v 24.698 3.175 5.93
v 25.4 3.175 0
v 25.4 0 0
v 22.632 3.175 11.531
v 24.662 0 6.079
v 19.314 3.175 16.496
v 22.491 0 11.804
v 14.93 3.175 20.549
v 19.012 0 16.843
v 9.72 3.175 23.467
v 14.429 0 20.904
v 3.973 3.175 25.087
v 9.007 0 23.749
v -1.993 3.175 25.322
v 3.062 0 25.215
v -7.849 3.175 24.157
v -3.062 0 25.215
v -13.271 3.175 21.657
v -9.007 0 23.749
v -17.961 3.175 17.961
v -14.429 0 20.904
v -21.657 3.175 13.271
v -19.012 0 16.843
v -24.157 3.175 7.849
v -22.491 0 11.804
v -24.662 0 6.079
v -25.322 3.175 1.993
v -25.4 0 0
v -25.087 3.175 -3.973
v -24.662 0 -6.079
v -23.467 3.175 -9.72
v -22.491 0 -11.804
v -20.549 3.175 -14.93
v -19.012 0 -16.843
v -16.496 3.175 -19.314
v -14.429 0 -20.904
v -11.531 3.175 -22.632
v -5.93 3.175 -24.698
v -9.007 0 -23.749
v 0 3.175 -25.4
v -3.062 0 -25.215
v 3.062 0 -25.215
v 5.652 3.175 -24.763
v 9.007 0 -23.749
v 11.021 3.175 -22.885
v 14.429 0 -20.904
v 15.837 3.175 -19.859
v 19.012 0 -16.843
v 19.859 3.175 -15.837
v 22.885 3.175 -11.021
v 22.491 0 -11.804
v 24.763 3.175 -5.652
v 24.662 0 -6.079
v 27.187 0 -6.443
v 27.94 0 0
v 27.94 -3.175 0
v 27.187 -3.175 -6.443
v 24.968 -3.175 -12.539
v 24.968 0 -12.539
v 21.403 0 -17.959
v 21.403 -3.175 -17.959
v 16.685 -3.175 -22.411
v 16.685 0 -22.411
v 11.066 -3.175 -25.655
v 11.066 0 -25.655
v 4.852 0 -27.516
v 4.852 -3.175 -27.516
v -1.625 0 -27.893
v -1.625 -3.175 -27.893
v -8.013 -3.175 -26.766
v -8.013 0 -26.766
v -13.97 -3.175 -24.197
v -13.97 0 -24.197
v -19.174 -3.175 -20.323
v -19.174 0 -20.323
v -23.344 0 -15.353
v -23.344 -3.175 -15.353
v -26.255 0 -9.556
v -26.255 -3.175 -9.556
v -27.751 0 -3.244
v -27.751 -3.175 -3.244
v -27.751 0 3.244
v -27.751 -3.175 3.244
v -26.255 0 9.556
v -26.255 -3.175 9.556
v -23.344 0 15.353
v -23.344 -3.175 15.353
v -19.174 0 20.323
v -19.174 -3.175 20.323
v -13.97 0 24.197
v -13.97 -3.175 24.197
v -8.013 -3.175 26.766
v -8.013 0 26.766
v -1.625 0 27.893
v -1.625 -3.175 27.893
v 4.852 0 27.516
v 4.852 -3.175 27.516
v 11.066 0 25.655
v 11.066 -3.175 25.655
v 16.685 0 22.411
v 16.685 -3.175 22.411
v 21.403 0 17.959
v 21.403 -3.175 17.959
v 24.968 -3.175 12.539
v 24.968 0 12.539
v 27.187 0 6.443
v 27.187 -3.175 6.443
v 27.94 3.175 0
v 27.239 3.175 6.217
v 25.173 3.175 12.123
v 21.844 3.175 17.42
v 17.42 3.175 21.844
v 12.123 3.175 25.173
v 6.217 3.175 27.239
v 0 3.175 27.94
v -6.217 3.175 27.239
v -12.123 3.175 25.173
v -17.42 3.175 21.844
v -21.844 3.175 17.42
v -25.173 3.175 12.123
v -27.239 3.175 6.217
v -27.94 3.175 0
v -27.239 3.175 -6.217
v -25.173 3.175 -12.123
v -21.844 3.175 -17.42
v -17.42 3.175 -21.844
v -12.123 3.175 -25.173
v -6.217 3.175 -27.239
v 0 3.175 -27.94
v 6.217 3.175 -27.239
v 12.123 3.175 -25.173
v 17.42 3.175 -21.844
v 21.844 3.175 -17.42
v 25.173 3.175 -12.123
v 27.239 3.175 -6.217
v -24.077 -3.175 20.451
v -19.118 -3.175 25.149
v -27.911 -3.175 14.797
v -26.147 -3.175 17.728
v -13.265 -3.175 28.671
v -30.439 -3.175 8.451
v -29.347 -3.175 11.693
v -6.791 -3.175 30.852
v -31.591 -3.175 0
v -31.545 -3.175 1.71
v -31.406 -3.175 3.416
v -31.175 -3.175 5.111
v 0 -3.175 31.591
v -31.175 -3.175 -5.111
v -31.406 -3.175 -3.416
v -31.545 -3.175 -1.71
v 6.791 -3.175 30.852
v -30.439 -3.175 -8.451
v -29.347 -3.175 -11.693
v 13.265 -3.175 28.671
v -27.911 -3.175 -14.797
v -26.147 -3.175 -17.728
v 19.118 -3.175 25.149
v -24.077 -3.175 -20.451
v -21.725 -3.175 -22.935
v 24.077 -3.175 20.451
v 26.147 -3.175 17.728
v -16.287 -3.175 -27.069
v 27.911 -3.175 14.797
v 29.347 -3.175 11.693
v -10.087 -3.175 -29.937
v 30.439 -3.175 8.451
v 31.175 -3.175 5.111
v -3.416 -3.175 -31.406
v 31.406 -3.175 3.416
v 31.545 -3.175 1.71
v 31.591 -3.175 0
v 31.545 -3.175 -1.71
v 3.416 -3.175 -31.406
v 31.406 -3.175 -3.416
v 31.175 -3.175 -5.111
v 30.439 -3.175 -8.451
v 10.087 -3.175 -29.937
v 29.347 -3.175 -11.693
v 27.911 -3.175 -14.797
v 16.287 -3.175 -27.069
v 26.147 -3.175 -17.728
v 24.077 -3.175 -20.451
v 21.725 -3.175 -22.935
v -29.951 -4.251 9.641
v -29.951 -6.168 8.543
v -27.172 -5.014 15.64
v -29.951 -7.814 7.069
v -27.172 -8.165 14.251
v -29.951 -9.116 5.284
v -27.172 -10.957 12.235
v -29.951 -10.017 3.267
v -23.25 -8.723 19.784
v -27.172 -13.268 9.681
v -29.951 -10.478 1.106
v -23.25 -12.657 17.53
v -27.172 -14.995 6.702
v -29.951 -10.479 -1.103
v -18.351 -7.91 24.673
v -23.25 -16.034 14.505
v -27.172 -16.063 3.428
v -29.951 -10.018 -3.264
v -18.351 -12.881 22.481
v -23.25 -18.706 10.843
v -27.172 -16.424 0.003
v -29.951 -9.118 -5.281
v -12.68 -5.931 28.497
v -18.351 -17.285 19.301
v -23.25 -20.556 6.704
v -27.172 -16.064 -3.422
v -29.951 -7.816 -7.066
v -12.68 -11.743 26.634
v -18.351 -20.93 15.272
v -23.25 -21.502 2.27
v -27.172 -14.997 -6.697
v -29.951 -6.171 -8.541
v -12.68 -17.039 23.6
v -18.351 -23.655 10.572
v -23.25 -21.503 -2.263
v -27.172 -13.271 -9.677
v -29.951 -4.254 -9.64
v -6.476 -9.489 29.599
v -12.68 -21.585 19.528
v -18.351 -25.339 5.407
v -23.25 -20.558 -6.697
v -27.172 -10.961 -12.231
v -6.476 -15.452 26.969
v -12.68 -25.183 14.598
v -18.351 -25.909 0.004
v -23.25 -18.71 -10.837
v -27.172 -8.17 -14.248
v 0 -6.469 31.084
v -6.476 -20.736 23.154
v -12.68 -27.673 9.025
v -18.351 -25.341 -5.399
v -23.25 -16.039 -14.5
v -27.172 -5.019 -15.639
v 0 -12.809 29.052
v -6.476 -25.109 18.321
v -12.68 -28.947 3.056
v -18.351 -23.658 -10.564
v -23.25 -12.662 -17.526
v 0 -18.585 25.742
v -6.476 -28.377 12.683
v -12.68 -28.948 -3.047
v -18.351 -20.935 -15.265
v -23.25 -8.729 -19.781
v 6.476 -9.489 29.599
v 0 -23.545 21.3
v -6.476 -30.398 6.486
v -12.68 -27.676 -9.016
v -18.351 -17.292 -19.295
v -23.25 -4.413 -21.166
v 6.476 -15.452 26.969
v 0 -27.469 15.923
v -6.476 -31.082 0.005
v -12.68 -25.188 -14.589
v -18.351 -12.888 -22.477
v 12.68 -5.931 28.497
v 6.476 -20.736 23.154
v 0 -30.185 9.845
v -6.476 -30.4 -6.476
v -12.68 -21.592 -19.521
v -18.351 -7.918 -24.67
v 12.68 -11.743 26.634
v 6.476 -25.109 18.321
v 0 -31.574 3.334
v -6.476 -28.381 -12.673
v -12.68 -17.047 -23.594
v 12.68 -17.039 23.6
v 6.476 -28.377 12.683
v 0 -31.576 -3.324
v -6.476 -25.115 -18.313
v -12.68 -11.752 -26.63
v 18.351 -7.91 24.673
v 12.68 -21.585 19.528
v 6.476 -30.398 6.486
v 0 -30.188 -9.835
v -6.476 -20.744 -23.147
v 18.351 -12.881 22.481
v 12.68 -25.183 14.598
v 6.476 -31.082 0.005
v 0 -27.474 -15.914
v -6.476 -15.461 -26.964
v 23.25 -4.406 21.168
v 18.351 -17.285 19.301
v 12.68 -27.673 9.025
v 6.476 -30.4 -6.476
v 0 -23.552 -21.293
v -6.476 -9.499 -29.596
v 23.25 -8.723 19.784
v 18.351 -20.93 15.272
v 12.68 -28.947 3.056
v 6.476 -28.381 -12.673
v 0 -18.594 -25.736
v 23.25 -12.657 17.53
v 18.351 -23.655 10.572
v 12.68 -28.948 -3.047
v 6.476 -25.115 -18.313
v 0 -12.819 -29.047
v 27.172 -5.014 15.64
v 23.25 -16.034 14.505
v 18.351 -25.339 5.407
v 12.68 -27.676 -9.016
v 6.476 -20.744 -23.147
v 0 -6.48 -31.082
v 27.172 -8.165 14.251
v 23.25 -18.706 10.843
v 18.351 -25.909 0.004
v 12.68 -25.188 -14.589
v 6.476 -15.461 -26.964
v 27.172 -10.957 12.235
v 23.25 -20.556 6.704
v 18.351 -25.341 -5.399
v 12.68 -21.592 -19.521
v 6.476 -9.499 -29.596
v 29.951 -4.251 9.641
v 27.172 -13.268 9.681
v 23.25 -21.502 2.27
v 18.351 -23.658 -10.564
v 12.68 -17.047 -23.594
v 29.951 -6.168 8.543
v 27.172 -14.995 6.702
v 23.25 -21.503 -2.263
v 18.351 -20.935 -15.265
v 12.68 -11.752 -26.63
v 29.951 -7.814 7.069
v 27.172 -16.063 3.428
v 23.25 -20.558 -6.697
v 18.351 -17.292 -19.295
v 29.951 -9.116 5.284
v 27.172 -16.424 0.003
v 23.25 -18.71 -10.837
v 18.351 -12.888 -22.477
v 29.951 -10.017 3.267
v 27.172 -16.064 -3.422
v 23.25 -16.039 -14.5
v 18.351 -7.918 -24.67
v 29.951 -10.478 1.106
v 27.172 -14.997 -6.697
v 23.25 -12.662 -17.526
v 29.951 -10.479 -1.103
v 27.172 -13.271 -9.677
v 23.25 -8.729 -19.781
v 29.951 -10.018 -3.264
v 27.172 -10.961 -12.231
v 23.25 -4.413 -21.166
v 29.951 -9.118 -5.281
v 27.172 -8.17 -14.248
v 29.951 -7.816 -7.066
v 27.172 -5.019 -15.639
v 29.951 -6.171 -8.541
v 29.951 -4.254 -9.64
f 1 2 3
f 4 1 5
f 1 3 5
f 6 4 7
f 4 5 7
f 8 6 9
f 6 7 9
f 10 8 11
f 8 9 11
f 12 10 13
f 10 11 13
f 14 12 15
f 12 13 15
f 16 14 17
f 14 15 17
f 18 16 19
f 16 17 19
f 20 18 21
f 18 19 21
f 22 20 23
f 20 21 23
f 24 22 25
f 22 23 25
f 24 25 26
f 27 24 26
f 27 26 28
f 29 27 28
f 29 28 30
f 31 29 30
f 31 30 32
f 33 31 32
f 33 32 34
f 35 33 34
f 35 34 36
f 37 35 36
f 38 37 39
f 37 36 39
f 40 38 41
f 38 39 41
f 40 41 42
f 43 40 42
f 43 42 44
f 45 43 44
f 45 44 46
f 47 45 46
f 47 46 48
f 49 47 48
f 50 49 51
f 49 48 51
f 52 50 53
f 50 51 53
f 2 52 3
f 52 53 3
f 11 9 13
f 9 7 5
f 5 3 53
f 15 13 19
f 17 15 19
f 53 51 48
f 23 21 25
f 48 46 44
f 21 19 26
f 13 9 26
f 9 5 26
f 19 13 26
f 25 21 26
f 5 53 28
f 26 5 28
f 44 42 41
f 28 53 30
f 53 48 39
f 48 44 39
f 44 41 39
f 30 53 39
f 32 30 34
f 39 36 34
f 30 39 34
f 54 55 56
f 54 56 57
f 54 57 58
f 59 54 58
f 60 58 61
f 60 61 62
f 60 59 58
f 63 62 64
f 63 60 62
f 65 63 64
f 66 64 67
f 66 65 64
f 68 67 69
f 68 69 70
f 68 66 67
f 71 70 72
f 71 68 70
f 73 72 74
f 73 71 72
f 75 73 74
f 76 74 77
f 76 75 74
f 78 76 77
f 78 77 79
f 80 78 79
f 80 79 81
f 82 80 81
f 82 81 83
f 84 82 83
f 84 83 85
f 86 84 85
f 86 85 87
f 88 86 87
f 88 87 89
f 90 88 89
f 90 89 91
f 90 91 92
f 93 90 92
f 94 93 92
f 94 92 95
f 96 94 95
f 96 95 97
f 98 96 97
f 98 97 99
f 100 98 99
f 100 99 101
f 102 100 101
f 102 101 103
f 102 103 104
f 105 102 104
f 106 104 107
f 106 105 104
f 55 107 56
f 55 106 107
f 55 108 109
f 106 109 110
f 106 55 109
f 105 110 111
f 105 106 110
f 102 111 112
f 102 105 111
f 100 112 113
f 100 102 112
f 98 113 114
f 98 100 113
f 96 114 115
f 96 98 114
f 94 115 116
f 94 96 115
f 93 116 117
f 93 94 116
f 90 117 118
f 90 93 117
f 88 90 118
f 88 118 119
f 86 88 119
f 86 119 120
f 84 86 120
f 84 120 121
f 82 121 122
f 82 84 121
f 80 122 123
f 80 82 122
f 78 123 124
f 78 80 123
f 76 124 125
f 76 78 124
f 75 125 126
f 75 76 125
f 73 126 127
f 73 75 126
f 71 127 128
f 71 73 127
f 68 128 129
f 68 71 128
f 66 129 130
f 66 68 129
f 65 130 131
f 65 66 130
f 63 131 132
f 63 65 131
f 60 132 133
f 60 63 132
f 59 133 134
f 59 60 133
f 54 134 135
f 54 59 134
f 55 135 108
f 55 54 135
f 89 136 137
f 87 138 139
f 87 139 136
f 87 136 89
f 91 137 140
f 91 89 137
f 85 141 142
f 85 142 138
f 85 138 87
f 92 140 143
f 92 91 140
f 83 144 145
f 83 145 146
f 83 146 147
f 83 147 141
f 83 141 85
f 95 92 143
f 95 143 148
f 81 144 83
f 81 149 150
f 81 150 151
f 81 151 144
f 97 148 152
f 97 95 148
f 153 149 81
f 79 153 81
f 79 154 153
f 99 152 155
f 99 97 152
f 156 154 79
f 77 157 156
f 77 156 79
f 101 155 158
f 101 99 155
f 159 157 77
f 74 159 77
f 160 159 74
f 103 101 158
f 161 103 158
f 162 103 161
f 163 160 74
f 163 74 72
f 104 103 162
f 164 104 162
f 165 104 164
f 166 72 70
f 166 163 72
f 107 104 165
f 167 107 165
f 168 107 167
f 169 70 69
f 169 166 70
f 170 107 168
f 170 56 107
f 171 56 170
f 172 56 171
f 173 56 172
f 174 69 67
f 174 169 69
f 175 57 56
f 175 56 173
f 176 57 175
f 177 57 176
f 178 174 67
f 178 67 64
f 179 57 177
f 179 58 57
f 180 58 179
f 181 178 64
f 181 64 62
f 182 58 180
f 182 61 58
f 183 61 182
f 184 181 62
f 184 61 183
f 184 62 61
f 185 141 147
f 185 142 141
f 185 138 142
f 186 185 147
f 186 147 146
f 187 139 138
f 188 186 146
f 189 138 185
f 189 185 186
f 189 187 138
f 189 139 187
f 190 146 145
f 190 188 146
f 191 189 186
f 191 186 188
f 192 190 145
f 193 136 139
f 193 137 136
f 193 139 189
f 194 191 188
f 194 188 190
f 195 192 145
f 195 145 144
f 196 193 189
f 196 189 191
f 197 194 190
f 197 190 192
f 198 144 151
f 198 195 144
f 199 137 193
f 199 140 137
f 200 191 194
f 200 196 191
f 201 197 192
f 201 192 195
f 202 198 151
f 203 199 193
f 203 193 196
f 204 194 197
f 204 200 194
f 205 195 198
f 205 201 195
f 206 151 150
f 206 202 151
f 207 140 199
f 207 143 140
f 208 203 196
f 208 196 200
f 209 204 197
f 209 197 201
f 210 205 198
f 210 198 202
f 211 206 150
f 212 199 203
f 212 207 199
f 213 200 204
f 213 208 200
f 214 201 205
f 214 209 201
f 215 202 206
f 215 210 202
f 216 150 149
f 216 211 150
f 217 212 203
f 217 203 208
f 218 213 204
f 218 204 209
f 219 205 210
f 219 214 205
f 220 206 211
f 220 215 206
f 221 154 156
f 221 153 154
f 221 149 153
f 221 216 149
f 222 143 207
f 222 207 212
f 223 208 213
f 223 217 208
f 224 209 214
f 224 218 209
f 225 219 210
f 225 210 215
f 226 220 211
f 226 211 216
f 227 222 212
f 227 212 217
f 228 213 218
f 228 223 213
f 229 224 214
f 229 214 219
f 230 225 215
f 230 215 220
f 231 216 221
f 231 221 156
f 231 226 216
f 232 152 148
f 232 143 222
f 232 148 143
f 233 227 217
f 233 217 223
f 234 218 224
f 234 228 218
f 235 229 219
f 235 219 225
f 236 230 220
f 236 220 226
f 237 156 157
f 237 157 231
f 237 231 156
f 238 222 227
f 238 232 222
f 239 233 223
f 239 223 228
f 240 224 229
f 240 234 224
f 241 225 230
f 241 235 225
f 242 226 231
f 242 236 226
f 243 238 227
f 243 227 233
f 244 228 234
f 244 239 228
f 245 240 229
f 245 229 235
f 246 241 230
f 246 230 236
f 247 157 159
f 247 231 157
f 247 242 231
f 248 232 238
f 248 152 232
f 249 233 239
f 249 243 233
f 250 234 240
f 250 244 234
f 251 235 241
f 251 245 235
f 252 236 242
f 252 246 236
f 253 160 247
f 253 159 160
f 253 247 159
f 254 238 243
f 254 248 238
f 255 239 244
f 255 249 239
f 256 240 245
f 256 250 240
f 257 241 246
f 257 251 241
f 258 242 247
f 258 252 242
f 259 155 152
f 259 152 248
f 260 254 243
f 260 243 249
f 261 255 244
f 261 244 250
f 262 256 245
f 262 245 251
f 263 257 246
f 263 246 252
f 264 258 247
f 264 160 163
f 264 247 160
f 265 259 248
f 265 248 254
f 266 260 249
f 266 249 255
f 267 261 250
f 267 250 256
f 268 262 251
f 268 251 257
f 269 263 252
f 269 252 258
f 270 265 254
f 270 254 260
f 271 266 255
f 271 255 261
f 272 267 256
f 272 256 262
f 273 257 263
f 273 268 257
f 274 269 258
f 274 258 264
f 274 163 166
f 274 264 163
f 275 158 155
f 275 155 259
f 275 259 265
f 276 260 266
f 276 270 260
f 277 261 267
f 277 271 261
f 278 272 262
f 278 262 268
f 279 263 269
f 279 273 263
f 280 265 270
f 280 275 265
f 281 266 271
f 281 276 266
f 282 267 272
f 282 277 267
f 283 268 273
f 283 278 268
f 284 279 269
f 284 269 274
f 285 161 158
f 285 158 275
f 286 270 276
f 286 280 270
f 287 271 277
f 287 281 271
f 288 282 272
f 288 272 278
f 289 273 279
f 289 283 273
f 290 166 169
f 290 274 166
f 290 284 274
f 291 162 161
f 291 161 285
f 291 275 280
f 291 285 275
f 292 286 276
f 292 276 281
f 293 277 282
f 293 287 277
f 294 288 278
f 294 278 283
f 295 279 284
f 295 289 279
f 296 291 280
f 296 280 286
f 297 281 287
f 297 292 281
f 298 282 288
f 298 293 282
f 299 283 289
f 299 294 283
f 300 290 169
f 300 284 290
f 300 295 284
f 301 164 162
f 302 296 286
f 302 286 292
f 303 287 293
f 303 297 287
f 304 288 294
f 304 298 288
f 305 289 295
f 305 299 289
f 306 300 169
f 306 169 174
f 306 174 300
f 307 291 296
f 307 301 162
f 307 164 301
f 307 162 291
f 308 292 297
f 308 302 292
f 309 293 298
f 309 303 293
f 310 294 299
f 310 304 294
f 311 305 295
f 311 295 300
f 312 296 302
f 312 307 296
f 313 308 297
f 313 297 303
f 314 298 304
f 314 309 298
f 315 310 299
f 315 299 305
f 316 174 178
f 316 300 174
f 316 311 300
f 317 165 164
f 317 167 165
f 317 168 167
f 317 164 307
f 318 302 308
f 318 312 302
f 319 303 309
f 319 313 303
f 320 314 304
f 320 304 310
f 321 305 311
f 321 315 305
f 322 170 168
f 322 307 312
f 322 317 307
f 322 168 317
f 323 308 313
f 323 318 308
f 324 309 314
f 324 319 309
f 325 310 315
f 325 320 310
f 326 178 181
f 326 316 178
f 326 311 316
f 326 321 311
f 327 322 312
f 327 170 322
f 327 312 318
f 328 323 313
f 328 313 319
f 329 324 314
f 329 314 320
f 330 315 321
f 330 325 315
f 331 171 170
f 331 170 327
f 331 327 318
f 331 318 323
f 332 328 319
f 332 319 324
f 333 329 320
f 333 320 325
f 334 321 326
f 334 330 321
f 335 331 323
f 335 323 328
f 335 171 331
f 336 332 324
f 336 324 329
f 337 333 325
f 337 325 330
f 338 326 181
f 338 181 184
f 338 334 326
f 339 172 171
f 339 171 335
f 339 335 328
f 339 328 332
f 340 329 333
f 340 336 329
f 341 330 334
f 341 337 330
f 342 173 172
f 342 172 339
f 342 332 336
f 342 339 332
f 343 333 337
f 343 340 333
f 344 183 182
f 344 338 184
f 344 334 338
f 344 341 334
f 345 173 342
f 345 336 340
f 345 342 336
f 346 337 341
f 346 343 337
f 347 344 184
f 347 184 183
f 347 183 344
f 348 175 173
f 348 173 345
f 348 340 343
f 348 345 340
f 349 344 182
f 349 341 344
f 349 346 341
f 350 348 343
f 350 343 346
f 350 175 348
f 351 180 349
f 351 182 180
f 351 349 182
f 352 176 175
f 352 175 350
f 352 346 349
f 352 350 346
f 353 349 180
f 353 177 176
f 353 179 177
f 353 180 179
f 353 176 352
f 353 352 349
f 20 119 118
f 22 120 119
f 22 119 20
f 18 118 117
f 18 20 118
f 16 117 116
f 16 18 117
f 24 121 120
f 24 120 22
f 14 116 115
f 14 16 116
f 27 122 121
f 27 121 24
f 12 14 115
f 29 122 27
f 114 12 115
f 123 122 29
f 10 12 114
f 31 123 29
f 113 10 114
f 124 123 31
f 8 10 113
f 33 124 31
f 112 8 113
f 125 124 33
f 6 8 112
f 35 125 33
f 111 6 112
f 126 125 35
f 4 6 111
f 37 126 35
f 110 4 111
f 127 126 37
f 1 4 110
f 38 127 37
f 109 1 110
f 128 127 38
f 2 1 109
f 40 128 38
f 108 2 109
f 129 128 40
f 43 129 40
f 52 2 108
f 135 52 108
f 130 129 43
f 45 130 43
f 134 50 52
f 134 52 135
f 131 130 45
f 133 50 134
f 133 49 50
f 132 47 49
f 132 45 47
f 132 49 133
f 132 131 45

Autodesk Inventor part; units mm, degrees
ref_plane "YZ Plane" through (0, 0, 0) normal (1, 0, 0) x (0, 1, 0)
ref_plane "XZ Plane" through (0, 0, 0) normal (0, 1, 0) x (-1, 0, 0)
ref_plane "XY Plane" through (0, 0, 0) normal (0, 0, 1) x (1, 0, 0)
sketch "Sketch1" plane through (0, 0, 0) normal (0, 1, 0) x (-1, 0, 0)
  arc A0 (31.75, 0) -> (-31.75, 0) centre (0, 0) ccw
  line L0 (0, 0) -> (-31.75, 0) construction
  line L1 (0, 0) -> (31.75, 0) construction
  line L2 (31.75, 0) -> (-31.75, 0)
  dimension "d0" = 31.75
  dimension "d1" = 180
revolve "Revolution1" add sketch "Sketch1" angle 180 about axis through (-31.75, 0, 0) along (1, 0, 0)
sketch "Sketch2" plane through (0, 0, 0) normal (0, 1, 0) x (1, 0, 0)
  line L0 (0, 0) -> (0, 27.94)
  line L1 (0, 0) -> (0, 25.4)
  circle A0 centre (0, 0) radius 27.94
  circle A1 centre (0, 0) radius 25.4
  dimension "d3" = 27.94
  dimension "d4" = 25.4
extrude "Extrusion1" add sketch "Sketch2" along normal blind 3.175
sketch "Sketch3" plane through (0, 0, 0) normal (0, 1, 0) x (1, 0, 0)
  circle A0 centre (0, 0) radius 27.94
  circle A1 centre (0, 0) radius 31.75
extrude "Extrusion2" cut sketch "Sketch3" against normal blind 3.175
properties part number "bottom ball bottom"
